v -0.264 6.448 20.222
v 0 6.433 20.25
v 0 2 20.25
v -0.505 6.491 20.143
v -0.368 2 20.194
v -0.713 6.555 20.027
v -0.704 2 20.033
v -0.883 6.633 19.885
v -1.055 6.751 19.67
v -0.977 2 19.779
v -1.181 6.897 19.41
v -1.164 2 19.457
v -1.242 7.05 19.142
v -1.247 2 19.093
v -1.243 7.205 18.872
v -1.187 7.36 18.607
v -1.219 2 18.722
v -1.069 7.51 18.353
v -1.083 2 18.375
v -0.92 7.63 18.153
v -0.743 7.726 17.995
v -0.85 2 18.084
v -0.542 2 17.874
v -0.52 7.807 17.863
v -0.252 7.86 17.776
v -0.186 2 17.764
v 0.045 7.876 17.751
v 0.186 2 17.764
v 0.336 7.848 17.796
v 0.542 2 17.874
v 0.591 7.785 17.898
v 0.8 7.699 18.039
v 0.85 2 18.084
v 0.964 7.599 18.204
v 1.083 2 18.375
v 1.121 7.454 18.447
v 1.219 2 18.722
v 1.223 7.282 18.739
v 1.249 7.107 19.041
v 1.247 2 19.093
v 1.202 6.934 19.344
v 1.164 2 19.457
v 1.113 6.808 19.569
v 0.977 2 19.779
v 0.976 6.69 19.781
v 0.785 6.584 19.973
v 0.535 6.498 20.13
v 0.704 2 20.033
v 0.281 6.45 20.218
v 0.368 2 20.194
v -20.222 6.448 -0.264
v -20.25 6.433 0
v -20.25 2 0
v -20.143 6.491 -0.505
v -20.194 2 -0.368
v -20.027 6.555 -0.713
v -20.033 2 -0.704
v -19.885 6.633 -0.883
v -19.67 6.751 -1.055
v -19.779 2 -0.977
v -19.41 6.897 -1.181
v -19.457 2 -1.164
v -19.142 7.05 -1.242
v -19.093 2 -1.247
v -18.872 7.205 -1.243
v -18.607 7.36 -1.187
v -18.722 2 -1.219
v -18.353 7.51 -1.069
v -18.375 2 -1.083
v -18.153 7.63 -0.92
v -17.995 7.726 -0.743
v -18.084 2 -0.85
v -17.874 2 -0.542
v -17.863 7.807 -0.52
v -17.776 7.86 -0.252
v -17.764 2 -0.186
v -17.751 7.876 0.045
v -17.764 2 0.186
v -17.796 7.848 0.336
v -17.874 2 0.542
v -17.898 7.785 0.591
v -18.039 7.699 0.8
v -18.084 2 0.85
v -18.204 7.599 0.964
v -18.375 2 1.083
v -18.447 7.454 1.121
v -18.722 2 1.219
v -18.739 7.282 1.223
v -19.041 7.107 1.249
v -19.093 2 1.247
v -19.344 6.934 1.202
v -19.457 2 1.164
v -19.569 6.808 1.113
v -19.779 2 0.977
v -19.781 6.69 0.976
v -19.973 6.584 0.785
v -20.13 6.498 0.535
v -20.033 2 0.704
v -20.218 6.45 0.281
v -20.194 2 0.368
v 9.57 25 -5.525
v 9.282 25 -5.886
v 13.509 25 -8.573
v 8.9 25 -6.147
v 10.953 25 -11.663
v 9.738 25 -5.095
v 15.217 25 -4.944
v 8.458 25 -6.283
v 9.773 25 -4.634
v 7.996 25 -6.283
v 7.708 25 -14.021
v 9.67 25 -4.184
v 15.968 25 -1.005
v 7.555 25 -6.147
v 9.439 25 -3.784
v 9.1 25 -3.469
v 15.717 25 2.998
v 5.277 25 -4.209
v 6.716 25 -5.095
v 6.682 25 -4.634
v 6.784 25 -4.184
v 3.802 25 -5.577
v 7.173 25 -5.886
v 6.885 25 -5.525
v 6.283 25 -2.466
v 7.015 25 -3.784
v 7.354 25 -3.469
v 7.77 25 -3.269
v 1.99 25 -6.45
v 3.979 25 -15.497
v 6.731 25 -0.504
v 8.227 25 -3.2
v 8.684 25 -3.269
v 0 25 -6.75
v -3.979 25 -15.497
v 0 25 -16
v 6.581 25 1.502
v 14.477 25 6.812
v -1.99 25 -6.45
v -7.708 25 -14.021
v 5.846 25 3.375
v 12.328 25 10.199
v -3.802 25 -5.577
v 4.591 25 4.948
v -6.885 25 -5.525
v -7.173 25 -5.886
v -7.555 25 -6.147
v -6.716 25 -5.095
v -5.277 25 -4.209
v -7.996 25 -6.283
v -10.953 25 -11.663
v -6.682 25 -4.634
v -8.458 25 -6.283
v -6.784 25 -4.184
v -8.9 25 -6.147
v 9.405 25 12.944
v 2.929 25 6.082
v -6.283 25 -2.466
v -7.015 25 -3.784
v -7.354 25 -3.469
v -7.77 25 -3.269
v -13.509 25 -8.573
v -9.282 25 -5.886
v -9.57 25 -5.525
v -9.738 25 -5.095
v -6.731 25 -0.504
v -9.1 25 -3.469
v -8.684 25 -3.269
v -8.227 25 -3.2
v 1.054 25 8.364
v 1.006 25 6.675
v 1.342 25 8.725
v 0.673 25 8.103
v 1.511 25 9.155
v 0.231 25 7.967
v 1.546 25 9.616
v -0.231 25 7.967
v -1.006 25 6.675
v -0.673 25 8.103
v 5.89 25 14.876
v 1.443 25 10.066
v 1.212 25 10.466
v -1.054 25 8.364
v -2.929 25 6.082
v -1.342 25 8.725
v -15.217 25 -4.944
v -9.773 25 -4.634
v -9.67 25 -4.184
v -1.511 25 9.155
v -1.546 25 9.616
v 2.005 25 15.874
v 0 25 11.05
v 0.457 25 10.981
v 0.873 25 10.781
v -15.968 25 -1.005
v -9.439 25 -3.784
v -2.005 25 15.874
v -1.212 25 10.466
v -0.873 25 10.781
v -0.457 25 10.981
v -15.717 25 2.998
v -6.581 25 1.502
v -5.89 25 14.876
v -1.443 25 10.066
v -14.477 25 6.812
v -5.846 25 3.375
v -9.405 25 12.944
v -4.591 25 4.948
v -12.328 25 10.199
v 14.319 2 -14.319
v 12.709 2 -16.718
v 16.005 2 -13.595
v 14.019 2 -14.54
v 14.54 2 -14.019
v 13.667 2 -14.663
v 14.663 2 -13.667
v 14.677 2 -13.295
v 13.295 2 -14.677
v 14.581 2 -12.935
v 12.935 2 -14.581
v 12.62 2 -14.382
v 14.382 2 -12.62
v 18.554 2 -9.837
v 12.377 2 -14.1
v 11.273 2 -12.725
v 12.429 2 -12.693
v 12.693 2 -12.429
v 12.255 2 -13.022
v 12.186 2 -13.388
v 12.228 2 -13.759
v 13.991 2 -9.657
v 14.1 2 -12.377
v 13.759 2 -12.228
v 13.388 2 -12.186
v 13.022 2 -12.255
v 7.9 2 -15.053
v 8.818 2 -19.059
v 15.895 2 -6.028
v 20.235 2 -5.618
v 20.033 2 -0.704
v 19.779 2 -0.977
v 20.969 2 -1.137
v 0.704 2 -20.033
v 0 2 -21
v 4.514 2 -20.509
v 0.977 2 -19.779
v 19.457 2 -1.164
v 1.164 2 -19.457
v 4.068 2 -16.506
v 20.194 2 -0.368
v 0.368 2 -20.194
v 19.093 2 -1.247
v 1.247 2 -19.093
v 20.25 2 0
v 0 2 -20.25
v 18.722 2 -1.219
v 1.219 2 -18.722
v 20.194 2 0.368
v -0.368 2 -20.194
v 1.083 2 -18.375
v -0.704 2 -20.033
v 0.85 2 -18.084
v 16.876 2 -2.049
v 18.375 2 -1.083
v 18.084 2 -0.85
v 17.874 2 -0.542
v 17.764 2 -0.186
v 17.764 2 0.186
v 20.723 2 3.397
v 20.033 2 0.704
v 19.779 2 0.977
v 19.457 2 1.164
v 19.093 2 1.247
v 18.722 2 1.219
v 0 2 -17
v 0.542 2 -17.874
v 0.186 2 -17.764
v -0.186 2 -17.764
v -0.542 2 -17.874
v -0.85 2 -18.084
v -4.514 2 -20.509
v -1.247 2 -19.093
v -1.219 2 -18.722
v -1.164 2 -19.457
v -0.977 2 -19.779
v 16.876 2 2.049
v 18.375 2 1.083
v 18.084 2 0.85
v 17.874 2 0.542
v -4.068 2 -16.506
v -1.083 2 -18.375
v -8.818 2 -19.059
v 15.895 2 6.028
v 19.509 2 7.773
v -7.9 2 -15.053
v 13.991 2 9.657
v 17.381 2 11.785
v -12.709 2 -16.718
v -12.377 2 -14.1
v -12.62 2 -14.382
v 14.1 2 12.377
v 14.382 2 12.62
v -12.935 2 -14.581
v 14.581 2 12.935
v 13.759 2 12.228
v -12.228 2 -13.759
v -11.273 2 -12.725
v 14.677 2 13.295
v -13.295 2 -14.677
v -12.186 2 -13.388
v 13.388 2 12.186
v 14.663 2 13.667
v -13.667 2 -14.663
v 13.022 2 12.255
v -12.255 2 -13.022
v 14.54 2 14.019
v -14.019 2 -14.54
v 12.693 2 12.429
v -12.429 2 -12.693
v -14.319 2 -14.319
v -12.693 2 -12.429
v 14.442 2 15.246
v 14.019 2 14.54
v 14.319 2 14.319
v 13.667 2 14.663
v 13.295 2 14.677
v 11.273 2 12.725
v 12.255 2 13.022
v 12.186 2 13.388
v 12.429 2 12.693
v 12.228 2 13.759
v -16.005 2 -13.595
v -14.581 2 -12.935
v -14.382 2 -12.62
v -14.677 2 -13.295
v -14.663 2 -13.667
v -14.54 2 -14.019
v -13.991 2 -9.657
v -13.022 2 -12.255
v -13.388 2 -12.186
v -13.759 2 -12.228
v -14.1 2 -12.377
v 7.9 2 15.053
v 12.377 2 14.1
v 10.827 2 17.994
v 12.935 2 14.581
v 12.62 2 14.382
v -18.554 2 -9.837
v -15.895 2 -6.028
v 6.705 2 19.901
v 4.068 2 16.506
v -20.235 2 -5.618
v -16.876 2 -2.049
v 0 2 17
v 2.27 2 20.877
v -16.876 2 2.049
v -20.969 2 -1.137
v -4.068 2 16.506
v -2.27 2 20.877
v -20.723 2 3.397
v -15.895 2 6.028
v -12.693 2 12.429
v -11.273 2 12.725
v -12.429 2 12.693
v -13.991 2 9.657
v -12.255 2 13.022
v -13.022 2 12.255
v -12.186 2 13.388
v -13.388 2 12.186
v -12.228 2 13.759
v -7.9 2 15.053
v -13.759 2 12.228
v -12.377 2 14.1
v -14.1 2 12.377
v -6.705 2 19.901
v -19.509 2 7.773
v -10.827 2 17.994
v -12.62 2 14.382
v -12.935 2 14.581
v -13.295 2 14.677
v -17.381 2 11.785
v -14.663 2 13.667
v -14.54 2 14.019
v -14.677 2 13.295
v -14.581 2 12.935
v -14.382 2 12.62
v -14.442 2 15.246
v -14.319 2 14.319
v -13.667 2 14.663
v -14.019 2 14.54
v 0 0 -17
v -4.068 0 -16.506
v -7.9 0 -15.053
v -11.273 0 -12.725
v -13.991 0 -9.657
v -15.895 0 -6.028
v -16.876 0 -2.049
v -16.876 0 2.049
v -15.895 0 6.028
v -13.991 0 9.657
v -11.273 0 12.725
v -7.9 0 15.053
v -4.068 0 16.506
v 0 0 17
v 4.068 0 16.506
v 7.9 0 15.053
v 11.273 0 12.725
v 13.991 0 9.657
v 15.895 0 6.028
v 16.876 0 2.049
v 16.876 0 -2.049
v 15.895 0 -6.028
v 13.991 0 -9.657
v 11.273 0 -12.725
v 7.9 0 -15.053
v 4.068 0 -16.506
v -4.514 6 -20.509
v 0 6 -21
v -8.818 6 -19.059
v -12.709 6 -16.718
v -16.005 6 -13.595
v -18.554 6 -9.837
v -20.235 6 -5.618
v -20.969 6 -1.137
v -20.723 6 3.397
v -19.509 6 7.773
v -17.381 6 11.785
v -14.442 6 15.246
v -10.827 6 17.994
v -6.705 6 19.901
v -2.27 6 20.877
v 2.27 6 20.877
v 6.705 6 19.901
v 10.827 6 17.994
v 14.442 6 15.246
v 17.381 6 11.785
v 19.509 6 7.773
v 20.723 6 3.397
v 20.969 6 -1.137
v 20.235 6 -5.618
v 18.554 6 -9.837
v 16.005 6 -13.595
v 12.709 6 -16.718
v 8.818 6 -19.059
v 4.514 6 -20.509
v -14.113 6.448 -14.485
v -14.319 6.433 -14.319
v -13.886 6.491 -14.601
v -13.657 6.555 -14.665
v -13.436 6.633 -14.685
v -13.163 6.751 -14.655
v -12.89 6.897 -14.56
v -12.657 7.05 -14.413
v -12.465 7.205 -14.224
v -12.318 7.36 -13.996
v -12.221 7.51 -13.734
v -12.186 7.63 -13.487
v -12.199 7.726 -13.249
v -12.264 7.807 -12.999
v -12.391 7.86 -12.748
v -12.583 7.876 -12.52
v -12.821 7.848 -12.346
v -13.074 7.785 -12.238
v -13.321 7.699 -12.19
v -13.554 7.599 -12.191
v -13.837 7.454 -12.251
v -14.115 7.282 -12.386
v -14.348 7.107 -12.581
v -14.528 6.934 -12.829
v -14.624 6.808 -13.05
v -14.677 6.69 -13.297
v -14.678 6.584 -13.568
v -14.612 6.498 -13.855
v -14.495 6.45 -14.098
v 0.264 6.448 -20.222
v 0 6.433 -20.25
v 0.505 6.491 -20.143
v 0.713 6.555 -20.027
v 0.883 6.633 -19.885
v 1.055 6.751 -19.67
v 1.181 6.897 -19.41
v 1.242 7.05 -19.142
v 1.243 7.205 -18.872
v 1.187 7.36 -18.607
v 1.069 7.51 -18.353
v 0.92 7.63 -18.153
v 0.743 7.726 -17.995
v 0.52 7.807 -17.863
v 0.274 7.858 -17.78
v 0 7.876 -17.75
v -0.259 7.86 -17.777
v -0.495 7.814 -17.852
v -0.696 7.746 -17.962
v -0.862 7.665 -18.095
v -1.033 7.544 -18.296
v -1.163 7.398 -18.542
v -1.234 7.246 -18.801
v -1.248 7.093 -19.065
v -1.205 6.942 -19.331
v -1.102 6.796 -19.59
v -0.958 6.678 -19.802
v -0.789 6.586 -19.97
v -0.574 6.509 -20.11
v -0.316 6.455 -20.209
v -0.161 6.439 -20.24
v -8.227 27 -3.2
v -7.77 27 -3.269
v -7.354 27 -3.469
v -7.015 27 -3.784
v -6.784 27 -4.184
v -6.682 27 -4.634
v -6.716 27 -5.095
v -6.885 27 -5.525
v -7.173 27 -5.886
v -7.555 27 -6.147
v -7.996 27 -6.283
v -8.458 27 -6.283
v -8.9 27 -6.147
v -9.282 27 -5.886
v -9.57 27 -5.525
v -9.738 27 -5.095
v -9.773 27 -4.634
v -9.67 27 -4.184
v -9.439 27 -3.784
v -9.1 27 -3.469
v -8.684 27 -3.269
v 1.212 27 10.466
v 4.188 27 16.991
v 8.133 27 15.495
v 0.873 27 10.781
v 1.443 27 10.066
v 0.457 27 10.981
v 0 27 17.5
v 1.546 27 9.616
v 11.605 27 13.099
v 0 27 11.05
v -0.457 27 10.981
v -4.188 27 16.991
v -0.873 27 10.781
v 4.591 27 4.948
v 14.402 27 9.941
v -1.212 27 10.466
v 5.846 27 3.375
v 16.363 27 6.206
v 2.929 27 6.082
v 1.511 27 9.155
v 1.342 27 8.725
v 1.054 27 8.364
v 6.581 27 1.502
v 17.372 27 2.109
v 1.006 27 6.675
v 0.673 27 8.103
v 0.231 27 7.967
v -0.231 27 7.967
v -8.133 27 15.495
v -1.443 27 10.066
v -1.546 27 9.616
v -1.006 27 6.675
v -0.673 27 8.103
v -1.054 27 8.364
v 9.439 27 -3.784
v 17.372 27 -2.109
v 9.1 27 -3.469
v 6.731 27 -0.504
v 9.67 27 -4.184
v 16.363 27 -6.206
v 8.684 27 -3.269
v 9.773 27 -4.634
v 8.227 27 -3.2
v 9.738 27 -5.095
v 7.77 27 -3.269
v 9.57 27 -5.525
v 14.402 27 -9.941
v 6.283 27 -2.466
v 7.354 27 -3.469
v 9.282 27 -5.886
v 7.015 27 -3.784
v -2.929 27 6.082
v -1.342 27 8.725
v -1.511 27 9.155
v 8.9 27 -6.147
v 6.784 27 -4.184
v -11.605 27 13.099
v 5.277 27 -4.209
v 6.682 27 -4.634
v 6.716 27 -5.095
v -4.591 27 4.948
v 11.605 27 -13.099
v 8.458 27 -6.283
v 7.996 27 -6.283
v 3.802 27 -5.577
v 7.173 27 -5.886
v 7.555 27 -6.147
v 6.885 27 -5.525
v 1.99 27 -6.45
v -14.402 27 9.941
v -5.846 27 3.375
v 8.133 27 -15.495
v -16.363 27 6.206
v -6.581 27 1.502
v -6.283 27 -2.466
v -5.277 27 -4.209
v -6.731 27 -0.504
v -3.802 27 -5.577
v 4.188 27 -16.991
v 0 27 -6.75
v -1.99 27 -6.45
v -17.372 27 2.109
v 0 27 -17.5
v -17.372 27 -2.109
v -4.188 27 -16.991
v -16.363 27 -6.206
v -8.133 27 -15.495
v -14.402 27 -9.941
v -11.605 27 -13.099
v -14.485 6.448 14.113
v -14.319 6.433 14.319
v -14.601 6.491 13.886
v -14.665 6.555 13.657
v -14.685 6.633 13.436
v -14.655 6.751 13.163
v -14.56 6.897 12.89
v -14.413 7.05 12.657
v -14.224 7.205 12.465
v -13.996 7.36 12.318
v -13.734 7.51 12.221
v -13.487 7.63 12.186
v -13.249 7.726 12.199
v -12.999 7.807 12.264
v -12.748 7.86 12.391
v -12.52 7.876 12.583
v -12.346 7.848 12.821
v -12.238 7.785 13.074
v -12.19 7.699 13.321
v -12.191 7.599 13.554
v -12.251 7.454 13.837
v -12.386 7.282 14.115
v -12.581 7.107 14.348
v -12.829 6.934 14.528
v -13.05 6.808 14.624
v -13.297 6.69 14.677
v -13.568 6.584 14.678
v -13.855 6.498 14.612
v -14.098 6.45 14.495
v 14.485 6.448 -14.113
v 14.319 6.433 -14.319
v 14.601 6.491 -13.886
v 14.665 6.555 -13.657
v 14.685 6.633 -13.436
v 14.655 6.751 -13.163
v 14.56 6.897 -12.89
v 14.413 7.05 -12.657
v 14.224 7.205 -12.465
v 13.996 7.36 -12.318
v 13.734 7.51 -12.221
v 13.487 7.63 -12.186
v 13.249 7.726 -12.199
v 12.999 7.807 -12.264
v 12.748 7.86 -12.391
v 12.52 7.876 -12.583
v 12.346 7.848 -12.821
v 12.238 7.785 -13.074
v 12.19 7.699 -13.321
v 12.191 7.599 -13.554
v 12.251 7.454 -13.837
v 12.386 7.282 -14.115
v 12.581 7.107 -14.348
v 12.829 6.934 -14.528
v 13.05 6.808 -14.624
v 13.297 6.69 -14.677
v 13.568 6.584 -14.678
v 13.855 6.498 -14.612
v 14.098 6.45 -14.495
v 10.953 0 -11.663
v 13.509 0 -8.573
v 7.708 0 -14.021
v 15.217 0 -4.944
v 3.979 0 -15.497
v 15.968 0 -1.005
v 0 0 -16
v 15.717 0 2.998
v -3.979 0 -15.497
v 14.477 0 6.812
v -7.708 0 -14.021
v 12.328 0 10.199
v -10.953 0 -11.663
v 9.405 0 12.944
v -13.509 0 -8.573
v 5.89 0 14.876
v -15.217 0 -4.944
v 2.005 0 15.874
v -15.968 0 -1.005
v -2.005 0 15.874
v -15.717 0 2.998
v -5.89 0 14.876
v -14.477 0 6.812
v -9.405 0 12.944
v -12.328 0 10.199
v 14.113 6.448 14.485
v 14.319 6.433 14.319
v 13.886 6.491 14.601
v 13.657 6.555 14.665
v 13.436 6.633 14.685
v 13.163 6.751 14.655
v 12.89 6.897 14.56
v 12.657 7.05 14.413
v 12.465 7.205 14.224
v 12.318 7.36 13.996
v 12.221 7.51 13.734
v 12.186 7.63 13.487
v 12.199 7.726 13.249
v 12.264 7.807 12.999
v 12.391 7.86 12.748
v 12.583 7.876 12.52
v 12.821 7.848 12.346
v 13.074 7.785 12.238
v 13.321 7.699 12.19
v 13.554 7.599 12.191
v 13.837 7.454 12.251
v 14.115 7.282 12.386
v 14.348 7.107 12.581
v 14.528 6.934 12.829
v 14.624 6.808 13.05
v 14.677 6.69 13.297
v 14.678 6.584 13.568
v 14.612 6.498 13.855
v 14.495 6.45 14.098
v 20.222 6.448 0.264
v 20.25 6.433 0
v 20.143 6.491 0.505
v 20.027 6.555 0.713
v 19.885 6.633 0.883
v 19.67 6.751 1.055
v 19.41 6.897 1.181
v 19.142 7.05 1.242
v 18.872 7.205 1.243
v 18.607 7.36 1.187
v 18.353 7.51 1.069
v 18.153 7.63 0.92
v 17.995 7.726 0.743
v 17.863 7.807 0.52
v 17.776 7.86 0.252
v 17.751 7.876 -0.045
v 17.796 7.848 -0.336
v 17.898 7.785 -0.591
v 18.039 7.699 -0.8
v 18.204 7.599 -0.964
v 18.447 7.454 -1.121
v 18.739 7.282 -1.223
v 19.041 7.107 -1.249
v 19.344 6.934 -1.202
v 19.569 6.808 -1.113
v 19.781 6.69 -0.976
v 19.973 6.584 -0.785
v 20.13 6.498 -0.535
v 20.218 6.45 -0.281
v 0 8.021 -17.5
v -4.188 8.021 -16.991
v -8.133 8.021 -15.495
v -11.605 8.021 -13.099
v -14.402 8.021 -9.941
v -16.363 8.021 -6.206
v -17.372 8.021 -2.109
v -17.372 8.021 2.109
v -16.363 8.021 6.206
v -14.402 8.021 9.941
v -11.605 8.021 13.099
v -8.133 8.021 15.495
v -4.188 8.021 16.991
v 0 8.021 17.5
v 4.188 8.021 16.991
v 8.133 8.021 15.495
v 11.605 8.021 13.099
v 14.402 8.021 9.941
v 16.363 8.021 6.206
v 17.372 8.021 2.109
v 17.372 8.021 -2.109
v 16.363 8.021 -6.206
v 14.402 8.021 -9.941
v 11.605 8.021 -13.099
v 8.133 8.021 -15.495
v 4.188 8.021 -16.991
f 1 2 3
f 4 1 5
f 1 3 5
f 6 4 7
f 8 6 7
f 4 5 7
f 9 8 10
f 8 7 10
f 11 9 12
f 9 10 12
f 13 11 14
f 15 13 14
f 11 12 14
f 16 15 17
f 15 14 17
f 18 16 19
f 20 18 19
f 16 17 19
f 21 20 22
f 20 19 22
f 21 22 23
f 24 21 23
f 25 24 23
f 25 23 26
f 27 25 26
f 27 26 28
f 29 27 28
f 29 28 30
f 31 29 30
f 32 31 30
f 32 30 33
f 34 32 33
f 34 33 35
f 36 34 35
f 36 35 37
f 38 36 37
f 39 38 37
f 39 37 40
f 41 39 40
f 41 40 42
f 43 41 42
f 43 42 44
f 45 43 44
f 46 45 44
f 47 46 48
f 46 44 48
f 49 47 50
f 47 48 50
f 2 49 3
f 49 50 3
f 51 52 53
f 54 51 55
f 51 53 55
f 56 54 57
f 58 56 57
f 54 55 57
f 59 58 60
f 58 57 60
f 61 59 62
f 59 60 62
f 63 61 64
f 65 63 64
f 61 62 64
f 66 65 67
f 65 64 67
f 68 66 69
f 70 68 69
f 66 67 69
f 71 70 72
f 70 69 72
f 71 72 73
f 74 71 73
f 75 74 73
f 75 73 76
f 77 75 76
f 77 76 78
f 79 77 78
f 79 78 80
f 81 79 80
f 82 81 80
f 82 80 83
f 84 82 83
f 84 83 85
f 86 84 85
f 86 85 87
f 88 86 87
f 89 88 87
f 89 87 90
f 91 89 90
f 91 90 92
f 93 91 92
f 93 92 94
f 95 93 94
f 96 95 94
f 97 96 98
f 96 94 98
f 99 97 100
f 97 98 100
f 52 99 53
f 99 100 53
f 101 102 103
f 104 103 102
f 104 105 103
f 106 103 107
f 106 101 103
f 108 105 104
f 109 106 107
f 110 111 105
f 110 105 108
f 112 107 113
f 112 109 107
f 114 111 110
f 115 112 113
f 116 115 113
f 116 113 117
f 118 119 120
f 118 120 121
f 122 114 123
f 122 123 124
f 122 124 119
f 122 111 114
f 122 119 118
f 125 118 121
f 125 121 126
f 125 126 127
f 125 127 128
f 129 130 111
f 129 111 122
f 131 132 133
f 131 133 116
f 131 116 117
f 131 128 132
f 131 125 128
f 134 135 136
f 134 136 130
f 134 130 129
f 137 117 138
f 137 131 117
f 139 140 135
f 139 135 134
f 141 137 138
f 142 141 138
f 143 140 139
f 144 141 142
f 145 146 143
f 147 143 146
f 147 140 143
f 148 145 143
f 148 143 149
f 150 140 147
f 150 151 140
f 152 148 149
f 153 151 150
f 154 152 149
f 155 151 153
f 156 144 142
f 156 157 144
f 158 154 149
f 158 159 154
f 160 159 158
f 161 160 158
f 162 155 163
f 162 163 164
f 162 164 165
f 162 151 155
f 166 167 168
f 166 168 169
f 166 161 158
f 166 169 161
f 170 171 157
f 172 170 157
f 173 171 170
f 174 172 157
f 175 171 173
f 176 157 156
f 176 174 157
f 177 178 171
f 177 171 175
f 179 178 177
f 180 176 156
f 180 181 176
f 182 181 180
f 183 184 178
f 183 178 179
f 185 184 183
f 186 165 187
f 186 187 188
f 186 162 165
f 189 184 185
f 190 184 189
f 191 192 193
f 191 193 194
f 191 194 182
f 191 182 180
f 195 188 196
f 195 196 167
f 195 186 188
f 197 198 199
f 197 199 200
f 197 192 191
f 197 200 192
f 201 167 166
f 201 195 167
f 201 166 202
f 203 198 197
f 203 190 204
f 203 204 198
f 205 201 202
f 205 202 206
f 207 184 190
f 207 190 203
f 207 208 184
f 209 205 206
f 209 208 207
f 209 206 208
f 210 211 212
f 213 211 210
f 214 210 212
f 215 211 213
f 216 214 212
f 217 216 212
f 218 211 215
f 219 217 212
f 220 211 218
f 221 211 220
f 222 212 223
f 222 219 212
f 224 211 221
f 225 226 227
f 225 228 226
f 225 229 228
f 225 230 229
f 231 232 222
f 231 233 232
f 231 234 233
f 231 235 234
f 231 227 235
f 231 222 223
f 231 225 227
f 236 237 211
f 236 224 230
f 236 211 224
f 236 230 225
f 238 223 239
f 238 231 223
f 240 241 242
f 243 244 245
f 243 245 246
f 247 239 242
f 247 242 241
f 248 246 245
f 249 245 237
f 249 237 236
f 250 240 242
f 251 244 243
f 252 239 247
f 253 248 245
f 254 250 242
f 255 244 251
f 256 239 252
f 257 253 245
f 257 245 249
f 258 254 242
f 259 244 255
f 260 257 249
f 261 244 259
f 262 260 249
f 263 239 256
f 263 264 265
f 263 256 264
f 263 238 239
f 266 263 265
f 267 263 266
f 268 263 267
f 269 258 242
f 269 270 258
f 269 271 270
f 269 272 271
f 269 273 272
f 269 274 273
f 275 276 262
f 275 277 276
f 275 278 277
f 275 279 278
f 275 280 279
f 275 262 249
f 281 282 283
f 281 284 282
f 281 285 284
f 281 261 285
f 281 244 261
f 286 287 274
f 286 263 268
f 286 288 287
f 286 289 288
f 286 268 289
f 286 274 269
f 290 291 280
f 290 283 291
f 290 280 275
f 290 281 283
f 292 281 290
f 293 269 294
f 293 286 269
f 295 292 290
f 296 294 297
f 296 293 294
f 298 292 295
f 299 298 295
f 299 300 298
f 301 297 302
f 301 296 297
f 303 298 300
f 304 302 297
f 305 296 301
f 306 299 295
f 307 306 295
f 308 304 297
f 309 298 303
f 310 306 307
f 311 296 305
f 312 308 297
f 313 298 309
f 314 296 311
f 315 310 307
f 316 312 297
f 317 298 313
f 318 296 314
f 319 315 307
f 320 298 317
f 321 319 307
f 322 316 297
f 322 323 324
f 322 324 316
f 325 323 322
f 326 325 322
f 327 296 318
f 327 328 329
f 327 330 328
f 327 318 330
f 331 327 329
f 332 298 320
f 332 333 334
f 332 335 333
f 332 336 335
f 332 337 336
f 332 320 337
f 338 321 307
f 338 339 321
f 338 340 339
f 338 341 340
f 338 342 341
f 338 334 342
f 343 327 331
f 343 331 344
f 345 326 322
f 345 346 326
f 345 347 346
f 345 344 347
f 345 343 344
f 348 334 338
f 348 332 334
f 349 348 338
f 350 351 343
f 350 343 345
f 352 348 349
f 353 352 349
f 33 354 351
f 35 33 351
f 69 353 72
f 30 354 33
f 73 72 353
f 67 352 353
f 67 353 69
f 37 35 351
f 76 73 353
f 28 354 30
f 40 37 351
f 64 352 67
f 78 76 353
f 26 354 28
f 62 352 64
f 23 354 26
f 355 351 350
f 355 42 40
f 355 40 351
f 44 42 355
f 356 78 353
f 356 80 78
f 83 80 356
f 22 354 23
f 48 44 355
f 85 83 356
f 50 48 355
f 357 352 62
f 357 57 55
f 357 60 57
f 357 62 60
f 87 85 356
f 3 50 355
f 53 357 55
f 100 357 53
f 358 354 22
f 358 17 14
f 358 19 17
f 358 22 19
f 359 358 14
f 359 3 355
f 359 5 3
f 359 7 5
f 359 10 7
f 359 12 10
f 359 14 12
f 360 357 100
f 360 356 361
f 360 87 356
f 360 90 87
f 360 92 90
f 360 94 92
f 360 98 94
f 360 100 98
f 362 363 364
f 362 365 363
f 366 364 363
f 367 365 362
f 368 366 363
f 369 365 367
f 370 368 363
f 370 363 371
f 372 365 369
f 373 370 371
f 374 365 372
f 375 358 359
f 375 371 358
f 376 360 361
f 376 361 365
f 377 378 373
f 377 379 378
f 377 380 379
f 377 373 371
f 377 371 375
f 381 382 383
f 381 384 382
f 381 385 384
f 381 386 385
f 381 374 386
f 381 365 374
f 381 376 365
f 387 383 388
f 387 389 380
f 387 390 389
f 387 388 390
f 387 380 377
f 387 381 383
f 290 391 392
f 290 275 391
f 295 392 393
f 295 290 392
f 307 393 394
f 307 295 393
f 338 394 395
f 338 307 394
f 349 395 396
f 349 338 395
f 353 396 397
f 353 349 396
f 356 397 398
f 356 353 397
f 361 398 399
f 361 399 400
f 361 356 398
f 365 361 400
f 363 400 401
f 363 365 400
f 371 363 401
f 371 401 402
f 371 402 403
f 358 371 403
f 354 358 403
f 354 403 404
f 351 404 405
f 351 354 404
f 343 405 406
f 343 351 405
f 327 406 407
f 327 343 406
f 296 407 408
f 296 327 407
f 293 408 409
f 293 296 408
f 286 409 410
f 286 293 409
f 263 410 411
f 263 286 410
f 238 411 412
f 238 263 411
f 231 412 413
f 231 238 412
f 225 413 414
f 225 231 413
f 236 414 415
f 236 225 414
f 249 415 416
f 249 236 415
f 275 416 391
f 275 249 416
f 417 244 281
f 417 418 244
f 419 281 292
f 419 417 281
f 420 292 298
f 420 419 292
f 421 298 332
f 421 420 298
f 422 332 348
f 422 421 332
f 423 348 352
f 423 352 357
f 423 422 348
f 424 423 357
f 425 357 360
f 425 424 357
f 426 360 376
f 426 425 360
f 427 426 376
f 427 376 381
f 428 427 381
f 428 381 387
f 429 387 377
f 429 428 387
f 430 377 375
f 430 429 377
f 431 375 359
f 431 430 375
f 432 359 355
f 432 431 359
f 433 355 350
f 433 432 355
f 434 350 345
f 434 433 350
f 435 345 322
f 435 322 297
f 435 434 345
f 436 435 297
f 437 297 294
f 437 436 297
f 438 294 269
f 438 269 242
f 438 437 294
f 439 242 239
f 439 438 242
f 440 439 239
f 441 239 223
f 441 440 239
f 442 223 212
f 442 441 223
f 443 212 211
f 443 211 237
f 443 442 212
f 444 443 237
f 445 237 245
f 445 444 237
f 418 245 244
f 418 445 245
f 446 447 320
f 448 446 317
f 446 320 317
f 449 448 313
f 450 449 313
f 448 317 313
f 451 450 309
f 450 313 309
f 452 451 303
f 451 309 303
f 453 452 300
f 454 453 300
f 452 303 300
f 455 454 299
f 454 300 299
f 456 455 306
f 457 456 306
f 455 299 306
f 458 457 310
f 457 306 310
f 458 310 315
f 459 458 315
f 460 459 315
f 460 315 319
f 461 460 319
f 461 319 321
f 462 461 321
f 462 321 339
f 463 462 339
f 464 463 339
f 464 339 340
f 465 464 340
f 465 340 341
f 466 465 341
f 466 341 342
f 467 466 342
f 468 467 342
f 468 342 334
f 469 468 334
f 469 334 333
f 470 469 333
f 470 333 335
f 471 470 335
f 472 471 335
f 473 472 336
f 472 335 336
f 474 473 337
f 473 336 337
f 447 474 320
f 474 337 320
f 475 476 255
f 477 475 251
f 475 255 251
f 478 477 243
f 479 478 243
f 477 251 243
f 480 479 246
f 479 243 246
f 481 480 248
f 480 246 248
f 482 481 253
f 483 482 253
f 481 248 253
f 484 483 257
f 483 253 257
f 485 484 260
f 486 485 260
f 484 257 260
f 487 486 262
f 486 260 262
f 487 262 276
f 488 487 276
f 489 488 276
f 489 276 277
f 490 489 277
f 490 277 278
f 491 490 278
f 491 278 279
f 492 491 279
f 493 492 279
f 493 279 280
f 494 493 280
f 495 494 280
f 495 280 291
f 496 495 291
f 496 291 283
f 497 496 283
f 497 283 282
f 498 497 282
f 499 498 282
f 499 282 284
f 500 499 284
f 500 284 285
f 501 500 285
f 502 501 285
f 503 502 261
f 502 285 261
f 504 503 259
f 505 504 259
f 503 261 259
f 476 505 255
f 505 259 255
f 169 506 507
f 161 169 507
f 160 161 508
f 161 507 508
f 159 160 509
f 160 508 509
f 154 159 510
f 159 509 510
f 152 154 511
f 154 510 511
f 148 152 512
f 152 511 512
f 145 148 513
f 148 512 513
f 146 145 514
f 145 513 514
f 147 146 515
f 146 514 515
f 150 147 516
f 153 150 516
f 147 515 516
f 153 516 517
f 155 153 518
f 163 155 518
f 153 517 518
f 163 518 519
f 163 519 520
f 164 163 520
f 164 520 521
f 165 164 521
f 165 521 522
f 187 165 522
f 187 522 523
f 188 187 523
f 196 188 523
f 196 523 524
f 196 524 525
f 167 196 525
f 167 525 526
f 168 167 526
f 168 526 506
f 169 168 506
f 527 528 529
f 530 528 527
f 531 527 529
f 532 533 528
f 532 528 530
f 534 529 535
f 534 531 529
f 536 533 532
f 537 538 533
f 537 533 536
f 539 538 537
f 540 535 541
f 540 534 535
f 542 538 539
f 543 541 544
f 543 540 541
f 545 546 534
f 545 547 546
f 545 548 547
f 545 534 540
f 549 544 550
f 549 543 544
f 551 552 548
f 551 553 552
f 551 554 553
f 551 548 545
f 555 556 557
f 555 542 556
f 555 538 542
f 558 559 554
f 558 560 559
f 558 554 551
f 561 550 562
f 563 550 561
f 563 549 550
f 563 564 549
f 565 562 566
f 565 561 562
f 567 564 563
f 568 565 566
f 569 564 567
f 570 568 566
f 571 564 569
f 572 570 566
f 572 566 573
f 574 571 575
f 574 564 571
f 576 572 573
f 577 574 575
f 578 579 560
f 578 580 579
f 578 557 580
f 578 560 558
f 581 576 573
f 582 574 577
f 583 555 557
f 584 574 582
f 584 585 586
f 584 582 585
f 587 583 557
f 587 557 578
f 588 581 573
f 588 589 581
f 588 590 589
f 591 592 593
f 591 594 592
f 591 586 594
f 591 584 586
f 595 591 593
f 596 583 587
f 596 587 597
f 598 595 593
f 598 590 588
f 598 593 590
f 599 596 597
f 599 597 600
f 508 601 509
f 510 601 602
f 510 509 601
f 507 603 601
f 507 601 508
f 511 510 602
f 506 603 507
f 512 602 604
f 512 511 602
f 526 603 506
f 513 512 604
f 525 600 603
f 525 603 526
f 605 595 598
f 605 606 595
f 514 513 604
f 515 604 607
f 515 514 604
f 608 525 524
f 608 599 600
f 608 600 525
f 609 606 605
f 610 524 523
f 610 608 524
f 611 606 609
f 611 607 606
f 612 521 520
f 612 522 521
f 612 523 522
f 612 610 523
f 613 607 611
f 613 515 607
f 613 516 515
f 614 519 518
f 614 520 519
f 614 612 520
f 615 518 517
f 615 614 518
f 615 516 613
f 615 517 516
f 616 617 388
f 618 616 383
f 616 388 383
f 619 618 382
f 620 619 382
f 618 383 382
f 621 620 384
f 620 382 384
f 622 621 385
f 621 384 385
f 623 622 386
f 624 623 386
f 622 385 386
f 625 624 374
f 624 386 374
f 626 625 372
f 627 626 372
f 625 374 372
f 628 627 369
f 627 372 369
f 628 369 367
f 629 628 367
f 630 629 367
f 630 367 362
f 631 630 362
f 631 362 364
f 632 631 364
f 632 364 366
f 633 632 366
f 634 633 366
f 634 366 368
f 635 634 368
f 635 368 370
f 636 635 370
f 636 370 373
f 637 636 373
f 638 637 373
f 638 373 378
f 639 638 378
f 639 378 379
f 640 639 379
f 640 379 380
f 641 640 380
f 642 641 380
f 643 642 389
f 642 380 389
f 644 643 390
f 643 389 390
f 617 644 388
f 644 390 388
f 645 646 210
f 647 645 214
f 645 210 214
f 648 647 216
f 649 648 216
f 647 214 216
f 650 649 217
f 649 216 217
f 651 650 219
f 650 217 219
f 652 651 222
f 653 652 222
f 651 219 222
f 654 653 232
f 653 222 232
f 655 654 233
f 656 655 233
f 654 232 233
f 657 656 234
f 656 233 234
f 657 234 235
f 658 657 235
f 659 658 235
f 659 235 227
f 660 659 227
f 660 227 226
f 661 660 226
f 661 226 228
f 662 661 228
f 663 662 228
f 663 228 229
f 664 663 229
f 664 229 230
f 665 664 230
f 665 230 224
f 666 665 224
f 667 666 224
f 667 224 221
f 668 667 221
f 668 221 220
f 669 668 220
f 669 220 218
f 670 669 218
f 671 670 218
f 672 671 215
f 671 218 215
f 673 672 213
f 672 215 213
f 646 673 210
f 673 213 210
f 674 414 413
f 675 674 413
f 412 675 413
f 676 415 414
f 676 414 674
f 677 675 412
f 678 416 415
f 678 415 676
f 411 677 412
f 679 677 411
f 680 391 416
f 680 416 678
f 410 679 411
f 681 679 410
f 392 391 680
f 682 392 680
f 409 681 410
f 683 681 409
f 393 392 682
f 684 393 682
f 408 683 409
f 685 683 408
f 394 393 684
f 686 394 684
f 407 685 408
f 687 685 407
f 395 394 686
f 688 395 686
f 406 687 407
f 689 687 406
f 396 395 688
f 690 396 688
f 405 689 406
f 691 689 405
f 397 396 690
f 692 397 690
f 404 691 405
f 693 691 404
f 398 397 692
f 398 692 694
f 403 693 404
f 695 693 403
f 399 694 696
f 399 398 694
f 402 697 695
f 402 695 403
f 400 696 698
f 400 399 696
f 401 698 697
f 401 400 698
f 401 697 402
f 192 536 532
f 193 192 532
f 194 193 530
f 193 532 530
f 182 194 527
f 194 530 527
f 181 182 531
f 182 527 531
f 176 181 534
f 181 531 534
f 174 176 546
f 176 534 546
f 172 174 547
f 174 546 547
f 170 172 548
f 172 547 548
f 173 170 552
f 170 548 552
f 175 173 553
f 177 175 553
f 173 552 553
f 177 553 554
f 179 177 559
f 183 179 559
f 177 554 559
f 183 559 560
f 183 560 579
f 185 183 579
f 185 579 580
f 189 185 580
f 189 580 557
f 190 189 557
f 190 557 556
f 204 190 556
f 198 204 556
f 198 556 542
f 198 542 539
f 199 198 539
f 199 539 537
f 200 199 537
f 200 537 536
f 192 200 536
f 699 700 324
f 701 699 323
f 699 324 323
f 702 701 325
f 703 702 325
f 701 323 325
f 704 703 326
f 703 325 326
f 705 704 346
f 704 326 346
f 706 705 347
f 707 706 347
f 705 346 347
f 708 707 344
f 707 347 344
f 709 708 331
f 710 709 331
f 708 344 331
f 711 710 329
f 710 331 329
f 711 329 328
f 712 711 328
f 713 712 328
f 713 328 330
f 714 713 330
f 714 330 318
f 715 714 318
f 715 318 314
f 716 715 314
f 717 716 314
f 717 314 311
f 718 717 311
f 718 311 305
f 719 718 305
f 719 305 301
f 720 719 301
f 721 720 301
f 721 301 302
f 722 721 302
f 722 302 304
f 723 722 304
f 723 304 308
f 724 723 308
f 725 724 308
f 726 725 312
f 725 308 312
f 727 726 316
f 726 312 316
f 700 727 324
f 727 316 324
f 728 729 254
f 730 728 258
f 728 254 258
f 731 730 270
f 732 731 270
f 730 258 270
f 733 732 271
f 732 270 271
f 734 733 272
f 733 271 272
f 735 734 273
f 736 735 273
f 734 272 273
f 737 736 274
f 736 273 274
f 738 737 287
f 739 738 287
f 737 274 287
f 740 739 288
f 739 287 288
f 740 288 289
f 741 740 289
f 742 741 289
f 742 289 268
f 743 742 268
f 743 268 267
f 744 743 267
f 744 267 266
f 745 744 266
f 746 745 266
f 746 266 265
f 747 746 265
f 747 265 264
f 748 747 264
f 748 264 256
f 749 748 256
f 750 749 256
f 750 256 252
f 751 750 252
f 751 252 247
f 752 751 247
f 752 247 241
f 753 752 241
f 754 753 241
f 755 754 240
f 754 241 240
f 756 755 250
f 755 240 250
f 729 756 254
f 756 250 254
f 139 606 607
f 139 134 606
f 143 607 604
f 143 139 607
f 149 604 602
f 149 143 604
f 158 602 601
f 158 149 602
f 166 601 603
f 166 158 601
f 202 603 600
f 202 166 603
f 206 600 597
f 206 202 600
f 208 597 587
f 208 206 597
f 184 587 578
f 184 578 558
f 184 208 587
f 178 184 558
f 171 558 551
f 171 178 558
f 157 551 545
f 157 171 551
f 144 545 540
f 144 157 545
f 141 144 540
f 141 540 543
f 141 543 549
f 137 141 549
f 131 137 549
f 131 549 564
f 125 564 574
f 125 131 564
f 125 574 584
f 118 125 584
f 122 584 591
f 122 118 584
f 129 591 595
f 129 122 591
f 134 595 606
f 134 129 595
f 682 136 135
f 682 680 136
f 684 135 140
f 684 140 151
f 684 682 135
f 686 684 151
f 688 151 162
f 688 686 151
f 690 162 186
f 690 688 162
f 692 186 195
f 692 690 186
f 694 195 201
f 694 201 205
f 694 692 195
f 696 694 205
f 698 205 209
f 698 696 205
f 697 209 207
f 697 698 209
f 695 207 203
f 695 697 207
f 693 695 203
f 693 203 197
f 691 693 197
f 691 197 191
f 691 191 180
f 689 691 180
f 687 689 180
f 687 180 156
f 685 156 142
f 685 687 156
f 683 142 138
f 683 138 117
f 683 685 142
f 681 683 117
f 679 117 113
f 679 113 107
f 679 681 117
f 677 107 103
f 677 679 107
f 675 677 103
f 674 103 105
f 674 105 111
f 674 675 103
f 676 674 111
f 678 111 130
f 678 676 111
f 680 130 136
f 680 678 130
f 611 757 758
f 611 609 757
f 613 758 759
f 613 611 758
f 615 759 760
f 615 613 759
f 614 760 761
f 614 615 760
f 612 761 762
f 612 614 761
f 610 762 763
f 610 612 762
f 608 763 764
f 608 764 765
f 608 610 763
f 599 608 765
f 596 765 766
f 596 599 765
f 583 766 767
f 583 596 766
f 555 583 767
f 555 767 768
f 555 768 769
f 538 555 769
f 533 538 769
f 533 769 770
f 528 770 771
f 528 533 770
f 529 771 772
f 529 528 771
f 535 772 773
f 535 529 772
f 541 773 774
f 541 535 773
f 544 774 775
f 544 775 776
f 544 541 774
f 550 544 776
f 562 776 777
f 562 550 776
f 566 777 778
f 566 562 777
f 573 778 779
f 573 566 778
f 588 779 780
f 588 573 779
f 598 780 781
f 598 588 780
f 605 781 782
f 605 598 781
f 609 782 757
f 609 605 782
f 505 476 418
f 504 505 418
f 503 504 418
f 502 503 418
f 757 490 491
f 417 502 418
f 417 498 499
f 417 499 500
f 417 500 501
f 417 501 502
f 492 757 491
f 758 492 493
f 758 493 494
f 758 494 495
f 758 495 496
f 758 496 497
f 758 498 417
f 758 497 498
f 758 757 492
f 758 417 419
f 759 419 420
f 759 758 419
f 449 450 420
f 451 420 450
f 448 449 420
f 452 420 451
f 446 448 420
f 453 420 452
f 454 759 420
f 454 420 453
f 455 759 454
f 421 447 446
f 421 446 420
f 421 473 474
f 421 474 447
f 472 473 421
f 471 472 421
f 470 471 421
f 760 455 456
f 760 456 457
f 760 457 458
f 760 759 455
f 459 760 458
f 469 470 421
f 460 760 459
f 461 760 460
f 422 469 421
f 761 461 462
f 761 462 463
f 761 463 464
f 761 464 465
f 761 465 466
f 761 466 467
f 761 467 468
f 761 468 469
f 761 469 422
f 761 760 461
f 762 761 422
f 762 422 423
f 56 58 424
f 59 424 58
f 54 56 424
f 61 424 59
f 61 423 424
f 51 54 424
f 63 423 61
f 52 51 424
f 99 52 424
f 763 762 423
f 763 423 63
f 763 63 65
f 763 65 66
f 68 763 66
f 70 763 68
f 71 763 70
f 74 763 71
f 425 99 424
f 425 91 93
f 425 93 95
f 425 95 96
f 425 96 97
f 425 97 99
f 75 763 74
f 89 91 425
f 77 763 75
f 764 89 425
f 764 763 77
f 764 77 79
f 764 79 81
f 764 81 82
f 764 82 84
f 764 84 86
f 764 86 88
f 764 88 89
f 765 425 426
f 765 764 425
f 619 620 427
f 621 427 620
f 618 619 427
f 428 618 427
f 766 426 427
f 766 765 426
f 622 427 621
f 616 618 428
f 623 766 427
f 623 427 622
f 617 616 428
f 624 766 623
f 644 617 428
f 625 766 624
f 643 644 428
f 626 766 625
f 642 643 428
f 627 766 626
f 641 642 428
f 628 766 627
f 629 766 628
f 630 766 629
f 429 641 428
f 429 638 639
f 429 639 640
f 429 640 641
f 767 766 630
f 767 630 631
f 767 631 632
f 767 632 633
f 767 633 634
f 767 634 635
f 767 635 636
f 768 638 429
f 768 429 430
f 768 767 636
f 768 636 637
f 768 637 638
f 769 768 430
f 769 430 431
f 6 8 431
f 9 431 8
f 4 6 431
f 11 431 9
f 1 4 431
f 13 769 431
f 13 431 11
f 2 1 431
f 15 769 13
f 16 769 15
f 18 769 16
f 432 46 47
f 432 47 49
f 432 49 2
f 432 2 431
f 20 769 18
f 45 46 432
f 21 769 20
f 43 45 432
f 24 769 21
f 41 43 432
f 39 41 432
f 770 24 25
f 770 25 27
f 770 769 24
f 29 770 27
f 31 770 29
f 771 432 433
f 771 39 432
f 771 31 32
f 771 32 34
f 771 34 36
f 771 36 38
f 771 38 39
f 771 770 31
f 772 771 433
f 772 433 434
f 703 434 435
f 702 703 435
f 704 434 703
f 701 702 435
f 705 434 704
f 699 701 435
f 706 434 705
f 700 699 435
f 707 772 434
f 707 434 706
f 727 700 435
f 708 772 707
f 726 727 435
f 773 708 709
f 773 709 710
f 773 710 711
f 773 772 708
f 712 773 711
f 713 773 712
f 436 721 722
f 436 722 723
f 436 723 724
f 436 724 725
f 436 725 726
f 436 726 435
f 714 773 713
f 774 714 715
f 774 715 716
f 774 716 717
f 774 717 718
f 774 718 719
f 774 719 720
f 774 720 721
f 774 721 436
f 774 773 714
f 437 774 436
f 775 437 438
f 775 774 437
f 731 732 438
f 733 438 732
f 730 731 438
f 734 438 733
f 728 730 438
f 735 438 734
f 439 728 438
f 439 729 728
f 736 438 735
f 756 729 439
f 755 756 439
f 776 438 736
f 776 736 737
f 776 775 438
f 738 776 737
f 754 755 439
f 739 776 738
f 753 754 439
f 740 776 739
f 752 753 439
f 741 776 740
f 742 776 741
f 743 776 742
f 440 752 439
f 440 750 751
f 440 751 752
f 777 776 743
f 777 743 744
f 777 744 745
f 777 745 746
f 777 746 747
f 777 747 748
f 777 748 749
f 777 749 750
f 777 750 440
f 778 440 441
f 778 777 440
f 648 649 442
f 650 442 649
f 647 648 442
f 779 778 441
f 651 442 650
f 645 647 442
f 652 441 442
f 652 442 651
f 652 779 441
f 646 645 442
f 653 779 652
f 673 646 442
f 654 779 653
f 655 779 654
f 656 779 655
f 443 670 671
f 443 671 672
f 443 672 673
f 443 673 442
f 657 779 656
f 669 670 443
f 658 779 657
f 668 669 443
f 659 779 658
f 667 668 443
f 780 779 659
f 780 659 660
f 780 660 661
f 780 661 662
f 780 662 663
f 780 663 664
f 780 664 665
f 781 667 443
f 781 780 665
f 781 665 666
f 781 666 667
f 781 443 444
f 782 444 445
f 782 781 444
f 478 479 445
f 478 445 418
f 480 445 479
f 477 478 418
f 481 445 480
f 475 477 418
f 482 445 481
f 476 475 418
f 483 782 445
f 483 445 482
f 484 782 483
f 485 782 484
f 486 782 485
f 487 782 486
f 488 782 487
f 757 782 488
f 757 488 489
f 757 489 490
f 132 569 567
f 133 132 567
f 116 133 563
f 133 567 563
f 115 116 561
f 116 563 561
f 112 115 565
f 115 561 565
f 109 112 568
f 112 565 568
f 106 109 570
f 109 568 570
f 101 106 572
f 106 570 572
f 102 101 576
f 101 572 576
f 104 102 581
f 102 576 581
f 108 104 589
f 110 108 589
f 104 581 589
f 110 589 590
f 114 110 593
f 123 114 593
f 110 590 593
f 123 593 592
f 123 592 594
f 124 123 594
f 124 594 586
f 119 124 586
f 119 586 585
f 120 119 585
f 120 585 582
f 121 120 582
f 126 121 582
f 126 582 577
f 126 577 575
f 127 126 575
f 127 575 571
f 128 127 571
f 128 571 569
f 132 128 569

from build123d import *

# Parameters (mm, degrees)
SKETCH_2_R               = 1.25
CUT_EXTRUDE_1_DEPTH      = 8
PATTERN_CIRCULAR_1_COUNT = 8
SKETCH_3_R               = 1.55
CUT_EXTRUDE_2_DEPTH      = 41.137264585


with BuildPart() as part:
    # 草图1 → 旋转1 (revolve)
    with BuildSketch(Plane.XY, mode=Mode.PRIVATE) as revolve_1_sk:
        Polygon((-16, 0), (-17, 0), (-17, 2), (-21, 2), (-21, 6), (-17.5, 8.020725942), (-17.5, 27), (-6.75, 27), (-6.75, 25), (-16, 25), align=None)
    revolve(revolve_1_sk.sketch.rotate(Axis((0, 0, 0), (0, 1, 0)), 270), axis=Axis((0, 0, 0), (0, 1, 0)))

    # 草图2 → 切除-拉伸1 (cut)
    with BuildSketch(Plane.XZ.offset(-2)):
        with Locations(Location((0, -19, 0), (0, 0, 270))):
            Circle(SKETCH_2_R)
    cut_extrude_1 = extrude(amount=-CUT_EXTRUDE_1_DEPTH, mode=Mode.SUBTRACT)

    # 阵列(圆周)1: 切除-拉伸1 ×8 about axis
    pattern_circular_1_axis = Axis((0, 0, 0), (0, 1, 0))
    for i in range(1, PATTERN_CIRCULAR_1_COUNT):
        add(cut_extrude_1.rotate(pattern_circular_1_axis, i * 360 / PATTERN_CIRCULAR_1_COUNT), mode=Mode.SUBTRACT)

    # 草图3 → 切除-拉伸2 (cut, through all)
    with BuildSketch(Plane(origin=(0, 27, 0), x_dir=(1, 0, 0), z_dir=(0, 1, 0))):
        with Locations(Location((0, -9.5, 0), (0, 0, 270))):
            Circle(SKETCH_3_R)
        with Locations(Location((-8.227241336, 4.75, 0), (0, 0, 270))):
            Circle(SKETCH_3_R)
        with Locations(Location((8.227241336, 4.75, 0), (0, 0, 270))):
            Circle(SKETCH_3_R)
    extrude(amount=-CUT_EXTRUDE_2_DEPTH, mode=Mode.SUBTRACT)


solid = part.part
